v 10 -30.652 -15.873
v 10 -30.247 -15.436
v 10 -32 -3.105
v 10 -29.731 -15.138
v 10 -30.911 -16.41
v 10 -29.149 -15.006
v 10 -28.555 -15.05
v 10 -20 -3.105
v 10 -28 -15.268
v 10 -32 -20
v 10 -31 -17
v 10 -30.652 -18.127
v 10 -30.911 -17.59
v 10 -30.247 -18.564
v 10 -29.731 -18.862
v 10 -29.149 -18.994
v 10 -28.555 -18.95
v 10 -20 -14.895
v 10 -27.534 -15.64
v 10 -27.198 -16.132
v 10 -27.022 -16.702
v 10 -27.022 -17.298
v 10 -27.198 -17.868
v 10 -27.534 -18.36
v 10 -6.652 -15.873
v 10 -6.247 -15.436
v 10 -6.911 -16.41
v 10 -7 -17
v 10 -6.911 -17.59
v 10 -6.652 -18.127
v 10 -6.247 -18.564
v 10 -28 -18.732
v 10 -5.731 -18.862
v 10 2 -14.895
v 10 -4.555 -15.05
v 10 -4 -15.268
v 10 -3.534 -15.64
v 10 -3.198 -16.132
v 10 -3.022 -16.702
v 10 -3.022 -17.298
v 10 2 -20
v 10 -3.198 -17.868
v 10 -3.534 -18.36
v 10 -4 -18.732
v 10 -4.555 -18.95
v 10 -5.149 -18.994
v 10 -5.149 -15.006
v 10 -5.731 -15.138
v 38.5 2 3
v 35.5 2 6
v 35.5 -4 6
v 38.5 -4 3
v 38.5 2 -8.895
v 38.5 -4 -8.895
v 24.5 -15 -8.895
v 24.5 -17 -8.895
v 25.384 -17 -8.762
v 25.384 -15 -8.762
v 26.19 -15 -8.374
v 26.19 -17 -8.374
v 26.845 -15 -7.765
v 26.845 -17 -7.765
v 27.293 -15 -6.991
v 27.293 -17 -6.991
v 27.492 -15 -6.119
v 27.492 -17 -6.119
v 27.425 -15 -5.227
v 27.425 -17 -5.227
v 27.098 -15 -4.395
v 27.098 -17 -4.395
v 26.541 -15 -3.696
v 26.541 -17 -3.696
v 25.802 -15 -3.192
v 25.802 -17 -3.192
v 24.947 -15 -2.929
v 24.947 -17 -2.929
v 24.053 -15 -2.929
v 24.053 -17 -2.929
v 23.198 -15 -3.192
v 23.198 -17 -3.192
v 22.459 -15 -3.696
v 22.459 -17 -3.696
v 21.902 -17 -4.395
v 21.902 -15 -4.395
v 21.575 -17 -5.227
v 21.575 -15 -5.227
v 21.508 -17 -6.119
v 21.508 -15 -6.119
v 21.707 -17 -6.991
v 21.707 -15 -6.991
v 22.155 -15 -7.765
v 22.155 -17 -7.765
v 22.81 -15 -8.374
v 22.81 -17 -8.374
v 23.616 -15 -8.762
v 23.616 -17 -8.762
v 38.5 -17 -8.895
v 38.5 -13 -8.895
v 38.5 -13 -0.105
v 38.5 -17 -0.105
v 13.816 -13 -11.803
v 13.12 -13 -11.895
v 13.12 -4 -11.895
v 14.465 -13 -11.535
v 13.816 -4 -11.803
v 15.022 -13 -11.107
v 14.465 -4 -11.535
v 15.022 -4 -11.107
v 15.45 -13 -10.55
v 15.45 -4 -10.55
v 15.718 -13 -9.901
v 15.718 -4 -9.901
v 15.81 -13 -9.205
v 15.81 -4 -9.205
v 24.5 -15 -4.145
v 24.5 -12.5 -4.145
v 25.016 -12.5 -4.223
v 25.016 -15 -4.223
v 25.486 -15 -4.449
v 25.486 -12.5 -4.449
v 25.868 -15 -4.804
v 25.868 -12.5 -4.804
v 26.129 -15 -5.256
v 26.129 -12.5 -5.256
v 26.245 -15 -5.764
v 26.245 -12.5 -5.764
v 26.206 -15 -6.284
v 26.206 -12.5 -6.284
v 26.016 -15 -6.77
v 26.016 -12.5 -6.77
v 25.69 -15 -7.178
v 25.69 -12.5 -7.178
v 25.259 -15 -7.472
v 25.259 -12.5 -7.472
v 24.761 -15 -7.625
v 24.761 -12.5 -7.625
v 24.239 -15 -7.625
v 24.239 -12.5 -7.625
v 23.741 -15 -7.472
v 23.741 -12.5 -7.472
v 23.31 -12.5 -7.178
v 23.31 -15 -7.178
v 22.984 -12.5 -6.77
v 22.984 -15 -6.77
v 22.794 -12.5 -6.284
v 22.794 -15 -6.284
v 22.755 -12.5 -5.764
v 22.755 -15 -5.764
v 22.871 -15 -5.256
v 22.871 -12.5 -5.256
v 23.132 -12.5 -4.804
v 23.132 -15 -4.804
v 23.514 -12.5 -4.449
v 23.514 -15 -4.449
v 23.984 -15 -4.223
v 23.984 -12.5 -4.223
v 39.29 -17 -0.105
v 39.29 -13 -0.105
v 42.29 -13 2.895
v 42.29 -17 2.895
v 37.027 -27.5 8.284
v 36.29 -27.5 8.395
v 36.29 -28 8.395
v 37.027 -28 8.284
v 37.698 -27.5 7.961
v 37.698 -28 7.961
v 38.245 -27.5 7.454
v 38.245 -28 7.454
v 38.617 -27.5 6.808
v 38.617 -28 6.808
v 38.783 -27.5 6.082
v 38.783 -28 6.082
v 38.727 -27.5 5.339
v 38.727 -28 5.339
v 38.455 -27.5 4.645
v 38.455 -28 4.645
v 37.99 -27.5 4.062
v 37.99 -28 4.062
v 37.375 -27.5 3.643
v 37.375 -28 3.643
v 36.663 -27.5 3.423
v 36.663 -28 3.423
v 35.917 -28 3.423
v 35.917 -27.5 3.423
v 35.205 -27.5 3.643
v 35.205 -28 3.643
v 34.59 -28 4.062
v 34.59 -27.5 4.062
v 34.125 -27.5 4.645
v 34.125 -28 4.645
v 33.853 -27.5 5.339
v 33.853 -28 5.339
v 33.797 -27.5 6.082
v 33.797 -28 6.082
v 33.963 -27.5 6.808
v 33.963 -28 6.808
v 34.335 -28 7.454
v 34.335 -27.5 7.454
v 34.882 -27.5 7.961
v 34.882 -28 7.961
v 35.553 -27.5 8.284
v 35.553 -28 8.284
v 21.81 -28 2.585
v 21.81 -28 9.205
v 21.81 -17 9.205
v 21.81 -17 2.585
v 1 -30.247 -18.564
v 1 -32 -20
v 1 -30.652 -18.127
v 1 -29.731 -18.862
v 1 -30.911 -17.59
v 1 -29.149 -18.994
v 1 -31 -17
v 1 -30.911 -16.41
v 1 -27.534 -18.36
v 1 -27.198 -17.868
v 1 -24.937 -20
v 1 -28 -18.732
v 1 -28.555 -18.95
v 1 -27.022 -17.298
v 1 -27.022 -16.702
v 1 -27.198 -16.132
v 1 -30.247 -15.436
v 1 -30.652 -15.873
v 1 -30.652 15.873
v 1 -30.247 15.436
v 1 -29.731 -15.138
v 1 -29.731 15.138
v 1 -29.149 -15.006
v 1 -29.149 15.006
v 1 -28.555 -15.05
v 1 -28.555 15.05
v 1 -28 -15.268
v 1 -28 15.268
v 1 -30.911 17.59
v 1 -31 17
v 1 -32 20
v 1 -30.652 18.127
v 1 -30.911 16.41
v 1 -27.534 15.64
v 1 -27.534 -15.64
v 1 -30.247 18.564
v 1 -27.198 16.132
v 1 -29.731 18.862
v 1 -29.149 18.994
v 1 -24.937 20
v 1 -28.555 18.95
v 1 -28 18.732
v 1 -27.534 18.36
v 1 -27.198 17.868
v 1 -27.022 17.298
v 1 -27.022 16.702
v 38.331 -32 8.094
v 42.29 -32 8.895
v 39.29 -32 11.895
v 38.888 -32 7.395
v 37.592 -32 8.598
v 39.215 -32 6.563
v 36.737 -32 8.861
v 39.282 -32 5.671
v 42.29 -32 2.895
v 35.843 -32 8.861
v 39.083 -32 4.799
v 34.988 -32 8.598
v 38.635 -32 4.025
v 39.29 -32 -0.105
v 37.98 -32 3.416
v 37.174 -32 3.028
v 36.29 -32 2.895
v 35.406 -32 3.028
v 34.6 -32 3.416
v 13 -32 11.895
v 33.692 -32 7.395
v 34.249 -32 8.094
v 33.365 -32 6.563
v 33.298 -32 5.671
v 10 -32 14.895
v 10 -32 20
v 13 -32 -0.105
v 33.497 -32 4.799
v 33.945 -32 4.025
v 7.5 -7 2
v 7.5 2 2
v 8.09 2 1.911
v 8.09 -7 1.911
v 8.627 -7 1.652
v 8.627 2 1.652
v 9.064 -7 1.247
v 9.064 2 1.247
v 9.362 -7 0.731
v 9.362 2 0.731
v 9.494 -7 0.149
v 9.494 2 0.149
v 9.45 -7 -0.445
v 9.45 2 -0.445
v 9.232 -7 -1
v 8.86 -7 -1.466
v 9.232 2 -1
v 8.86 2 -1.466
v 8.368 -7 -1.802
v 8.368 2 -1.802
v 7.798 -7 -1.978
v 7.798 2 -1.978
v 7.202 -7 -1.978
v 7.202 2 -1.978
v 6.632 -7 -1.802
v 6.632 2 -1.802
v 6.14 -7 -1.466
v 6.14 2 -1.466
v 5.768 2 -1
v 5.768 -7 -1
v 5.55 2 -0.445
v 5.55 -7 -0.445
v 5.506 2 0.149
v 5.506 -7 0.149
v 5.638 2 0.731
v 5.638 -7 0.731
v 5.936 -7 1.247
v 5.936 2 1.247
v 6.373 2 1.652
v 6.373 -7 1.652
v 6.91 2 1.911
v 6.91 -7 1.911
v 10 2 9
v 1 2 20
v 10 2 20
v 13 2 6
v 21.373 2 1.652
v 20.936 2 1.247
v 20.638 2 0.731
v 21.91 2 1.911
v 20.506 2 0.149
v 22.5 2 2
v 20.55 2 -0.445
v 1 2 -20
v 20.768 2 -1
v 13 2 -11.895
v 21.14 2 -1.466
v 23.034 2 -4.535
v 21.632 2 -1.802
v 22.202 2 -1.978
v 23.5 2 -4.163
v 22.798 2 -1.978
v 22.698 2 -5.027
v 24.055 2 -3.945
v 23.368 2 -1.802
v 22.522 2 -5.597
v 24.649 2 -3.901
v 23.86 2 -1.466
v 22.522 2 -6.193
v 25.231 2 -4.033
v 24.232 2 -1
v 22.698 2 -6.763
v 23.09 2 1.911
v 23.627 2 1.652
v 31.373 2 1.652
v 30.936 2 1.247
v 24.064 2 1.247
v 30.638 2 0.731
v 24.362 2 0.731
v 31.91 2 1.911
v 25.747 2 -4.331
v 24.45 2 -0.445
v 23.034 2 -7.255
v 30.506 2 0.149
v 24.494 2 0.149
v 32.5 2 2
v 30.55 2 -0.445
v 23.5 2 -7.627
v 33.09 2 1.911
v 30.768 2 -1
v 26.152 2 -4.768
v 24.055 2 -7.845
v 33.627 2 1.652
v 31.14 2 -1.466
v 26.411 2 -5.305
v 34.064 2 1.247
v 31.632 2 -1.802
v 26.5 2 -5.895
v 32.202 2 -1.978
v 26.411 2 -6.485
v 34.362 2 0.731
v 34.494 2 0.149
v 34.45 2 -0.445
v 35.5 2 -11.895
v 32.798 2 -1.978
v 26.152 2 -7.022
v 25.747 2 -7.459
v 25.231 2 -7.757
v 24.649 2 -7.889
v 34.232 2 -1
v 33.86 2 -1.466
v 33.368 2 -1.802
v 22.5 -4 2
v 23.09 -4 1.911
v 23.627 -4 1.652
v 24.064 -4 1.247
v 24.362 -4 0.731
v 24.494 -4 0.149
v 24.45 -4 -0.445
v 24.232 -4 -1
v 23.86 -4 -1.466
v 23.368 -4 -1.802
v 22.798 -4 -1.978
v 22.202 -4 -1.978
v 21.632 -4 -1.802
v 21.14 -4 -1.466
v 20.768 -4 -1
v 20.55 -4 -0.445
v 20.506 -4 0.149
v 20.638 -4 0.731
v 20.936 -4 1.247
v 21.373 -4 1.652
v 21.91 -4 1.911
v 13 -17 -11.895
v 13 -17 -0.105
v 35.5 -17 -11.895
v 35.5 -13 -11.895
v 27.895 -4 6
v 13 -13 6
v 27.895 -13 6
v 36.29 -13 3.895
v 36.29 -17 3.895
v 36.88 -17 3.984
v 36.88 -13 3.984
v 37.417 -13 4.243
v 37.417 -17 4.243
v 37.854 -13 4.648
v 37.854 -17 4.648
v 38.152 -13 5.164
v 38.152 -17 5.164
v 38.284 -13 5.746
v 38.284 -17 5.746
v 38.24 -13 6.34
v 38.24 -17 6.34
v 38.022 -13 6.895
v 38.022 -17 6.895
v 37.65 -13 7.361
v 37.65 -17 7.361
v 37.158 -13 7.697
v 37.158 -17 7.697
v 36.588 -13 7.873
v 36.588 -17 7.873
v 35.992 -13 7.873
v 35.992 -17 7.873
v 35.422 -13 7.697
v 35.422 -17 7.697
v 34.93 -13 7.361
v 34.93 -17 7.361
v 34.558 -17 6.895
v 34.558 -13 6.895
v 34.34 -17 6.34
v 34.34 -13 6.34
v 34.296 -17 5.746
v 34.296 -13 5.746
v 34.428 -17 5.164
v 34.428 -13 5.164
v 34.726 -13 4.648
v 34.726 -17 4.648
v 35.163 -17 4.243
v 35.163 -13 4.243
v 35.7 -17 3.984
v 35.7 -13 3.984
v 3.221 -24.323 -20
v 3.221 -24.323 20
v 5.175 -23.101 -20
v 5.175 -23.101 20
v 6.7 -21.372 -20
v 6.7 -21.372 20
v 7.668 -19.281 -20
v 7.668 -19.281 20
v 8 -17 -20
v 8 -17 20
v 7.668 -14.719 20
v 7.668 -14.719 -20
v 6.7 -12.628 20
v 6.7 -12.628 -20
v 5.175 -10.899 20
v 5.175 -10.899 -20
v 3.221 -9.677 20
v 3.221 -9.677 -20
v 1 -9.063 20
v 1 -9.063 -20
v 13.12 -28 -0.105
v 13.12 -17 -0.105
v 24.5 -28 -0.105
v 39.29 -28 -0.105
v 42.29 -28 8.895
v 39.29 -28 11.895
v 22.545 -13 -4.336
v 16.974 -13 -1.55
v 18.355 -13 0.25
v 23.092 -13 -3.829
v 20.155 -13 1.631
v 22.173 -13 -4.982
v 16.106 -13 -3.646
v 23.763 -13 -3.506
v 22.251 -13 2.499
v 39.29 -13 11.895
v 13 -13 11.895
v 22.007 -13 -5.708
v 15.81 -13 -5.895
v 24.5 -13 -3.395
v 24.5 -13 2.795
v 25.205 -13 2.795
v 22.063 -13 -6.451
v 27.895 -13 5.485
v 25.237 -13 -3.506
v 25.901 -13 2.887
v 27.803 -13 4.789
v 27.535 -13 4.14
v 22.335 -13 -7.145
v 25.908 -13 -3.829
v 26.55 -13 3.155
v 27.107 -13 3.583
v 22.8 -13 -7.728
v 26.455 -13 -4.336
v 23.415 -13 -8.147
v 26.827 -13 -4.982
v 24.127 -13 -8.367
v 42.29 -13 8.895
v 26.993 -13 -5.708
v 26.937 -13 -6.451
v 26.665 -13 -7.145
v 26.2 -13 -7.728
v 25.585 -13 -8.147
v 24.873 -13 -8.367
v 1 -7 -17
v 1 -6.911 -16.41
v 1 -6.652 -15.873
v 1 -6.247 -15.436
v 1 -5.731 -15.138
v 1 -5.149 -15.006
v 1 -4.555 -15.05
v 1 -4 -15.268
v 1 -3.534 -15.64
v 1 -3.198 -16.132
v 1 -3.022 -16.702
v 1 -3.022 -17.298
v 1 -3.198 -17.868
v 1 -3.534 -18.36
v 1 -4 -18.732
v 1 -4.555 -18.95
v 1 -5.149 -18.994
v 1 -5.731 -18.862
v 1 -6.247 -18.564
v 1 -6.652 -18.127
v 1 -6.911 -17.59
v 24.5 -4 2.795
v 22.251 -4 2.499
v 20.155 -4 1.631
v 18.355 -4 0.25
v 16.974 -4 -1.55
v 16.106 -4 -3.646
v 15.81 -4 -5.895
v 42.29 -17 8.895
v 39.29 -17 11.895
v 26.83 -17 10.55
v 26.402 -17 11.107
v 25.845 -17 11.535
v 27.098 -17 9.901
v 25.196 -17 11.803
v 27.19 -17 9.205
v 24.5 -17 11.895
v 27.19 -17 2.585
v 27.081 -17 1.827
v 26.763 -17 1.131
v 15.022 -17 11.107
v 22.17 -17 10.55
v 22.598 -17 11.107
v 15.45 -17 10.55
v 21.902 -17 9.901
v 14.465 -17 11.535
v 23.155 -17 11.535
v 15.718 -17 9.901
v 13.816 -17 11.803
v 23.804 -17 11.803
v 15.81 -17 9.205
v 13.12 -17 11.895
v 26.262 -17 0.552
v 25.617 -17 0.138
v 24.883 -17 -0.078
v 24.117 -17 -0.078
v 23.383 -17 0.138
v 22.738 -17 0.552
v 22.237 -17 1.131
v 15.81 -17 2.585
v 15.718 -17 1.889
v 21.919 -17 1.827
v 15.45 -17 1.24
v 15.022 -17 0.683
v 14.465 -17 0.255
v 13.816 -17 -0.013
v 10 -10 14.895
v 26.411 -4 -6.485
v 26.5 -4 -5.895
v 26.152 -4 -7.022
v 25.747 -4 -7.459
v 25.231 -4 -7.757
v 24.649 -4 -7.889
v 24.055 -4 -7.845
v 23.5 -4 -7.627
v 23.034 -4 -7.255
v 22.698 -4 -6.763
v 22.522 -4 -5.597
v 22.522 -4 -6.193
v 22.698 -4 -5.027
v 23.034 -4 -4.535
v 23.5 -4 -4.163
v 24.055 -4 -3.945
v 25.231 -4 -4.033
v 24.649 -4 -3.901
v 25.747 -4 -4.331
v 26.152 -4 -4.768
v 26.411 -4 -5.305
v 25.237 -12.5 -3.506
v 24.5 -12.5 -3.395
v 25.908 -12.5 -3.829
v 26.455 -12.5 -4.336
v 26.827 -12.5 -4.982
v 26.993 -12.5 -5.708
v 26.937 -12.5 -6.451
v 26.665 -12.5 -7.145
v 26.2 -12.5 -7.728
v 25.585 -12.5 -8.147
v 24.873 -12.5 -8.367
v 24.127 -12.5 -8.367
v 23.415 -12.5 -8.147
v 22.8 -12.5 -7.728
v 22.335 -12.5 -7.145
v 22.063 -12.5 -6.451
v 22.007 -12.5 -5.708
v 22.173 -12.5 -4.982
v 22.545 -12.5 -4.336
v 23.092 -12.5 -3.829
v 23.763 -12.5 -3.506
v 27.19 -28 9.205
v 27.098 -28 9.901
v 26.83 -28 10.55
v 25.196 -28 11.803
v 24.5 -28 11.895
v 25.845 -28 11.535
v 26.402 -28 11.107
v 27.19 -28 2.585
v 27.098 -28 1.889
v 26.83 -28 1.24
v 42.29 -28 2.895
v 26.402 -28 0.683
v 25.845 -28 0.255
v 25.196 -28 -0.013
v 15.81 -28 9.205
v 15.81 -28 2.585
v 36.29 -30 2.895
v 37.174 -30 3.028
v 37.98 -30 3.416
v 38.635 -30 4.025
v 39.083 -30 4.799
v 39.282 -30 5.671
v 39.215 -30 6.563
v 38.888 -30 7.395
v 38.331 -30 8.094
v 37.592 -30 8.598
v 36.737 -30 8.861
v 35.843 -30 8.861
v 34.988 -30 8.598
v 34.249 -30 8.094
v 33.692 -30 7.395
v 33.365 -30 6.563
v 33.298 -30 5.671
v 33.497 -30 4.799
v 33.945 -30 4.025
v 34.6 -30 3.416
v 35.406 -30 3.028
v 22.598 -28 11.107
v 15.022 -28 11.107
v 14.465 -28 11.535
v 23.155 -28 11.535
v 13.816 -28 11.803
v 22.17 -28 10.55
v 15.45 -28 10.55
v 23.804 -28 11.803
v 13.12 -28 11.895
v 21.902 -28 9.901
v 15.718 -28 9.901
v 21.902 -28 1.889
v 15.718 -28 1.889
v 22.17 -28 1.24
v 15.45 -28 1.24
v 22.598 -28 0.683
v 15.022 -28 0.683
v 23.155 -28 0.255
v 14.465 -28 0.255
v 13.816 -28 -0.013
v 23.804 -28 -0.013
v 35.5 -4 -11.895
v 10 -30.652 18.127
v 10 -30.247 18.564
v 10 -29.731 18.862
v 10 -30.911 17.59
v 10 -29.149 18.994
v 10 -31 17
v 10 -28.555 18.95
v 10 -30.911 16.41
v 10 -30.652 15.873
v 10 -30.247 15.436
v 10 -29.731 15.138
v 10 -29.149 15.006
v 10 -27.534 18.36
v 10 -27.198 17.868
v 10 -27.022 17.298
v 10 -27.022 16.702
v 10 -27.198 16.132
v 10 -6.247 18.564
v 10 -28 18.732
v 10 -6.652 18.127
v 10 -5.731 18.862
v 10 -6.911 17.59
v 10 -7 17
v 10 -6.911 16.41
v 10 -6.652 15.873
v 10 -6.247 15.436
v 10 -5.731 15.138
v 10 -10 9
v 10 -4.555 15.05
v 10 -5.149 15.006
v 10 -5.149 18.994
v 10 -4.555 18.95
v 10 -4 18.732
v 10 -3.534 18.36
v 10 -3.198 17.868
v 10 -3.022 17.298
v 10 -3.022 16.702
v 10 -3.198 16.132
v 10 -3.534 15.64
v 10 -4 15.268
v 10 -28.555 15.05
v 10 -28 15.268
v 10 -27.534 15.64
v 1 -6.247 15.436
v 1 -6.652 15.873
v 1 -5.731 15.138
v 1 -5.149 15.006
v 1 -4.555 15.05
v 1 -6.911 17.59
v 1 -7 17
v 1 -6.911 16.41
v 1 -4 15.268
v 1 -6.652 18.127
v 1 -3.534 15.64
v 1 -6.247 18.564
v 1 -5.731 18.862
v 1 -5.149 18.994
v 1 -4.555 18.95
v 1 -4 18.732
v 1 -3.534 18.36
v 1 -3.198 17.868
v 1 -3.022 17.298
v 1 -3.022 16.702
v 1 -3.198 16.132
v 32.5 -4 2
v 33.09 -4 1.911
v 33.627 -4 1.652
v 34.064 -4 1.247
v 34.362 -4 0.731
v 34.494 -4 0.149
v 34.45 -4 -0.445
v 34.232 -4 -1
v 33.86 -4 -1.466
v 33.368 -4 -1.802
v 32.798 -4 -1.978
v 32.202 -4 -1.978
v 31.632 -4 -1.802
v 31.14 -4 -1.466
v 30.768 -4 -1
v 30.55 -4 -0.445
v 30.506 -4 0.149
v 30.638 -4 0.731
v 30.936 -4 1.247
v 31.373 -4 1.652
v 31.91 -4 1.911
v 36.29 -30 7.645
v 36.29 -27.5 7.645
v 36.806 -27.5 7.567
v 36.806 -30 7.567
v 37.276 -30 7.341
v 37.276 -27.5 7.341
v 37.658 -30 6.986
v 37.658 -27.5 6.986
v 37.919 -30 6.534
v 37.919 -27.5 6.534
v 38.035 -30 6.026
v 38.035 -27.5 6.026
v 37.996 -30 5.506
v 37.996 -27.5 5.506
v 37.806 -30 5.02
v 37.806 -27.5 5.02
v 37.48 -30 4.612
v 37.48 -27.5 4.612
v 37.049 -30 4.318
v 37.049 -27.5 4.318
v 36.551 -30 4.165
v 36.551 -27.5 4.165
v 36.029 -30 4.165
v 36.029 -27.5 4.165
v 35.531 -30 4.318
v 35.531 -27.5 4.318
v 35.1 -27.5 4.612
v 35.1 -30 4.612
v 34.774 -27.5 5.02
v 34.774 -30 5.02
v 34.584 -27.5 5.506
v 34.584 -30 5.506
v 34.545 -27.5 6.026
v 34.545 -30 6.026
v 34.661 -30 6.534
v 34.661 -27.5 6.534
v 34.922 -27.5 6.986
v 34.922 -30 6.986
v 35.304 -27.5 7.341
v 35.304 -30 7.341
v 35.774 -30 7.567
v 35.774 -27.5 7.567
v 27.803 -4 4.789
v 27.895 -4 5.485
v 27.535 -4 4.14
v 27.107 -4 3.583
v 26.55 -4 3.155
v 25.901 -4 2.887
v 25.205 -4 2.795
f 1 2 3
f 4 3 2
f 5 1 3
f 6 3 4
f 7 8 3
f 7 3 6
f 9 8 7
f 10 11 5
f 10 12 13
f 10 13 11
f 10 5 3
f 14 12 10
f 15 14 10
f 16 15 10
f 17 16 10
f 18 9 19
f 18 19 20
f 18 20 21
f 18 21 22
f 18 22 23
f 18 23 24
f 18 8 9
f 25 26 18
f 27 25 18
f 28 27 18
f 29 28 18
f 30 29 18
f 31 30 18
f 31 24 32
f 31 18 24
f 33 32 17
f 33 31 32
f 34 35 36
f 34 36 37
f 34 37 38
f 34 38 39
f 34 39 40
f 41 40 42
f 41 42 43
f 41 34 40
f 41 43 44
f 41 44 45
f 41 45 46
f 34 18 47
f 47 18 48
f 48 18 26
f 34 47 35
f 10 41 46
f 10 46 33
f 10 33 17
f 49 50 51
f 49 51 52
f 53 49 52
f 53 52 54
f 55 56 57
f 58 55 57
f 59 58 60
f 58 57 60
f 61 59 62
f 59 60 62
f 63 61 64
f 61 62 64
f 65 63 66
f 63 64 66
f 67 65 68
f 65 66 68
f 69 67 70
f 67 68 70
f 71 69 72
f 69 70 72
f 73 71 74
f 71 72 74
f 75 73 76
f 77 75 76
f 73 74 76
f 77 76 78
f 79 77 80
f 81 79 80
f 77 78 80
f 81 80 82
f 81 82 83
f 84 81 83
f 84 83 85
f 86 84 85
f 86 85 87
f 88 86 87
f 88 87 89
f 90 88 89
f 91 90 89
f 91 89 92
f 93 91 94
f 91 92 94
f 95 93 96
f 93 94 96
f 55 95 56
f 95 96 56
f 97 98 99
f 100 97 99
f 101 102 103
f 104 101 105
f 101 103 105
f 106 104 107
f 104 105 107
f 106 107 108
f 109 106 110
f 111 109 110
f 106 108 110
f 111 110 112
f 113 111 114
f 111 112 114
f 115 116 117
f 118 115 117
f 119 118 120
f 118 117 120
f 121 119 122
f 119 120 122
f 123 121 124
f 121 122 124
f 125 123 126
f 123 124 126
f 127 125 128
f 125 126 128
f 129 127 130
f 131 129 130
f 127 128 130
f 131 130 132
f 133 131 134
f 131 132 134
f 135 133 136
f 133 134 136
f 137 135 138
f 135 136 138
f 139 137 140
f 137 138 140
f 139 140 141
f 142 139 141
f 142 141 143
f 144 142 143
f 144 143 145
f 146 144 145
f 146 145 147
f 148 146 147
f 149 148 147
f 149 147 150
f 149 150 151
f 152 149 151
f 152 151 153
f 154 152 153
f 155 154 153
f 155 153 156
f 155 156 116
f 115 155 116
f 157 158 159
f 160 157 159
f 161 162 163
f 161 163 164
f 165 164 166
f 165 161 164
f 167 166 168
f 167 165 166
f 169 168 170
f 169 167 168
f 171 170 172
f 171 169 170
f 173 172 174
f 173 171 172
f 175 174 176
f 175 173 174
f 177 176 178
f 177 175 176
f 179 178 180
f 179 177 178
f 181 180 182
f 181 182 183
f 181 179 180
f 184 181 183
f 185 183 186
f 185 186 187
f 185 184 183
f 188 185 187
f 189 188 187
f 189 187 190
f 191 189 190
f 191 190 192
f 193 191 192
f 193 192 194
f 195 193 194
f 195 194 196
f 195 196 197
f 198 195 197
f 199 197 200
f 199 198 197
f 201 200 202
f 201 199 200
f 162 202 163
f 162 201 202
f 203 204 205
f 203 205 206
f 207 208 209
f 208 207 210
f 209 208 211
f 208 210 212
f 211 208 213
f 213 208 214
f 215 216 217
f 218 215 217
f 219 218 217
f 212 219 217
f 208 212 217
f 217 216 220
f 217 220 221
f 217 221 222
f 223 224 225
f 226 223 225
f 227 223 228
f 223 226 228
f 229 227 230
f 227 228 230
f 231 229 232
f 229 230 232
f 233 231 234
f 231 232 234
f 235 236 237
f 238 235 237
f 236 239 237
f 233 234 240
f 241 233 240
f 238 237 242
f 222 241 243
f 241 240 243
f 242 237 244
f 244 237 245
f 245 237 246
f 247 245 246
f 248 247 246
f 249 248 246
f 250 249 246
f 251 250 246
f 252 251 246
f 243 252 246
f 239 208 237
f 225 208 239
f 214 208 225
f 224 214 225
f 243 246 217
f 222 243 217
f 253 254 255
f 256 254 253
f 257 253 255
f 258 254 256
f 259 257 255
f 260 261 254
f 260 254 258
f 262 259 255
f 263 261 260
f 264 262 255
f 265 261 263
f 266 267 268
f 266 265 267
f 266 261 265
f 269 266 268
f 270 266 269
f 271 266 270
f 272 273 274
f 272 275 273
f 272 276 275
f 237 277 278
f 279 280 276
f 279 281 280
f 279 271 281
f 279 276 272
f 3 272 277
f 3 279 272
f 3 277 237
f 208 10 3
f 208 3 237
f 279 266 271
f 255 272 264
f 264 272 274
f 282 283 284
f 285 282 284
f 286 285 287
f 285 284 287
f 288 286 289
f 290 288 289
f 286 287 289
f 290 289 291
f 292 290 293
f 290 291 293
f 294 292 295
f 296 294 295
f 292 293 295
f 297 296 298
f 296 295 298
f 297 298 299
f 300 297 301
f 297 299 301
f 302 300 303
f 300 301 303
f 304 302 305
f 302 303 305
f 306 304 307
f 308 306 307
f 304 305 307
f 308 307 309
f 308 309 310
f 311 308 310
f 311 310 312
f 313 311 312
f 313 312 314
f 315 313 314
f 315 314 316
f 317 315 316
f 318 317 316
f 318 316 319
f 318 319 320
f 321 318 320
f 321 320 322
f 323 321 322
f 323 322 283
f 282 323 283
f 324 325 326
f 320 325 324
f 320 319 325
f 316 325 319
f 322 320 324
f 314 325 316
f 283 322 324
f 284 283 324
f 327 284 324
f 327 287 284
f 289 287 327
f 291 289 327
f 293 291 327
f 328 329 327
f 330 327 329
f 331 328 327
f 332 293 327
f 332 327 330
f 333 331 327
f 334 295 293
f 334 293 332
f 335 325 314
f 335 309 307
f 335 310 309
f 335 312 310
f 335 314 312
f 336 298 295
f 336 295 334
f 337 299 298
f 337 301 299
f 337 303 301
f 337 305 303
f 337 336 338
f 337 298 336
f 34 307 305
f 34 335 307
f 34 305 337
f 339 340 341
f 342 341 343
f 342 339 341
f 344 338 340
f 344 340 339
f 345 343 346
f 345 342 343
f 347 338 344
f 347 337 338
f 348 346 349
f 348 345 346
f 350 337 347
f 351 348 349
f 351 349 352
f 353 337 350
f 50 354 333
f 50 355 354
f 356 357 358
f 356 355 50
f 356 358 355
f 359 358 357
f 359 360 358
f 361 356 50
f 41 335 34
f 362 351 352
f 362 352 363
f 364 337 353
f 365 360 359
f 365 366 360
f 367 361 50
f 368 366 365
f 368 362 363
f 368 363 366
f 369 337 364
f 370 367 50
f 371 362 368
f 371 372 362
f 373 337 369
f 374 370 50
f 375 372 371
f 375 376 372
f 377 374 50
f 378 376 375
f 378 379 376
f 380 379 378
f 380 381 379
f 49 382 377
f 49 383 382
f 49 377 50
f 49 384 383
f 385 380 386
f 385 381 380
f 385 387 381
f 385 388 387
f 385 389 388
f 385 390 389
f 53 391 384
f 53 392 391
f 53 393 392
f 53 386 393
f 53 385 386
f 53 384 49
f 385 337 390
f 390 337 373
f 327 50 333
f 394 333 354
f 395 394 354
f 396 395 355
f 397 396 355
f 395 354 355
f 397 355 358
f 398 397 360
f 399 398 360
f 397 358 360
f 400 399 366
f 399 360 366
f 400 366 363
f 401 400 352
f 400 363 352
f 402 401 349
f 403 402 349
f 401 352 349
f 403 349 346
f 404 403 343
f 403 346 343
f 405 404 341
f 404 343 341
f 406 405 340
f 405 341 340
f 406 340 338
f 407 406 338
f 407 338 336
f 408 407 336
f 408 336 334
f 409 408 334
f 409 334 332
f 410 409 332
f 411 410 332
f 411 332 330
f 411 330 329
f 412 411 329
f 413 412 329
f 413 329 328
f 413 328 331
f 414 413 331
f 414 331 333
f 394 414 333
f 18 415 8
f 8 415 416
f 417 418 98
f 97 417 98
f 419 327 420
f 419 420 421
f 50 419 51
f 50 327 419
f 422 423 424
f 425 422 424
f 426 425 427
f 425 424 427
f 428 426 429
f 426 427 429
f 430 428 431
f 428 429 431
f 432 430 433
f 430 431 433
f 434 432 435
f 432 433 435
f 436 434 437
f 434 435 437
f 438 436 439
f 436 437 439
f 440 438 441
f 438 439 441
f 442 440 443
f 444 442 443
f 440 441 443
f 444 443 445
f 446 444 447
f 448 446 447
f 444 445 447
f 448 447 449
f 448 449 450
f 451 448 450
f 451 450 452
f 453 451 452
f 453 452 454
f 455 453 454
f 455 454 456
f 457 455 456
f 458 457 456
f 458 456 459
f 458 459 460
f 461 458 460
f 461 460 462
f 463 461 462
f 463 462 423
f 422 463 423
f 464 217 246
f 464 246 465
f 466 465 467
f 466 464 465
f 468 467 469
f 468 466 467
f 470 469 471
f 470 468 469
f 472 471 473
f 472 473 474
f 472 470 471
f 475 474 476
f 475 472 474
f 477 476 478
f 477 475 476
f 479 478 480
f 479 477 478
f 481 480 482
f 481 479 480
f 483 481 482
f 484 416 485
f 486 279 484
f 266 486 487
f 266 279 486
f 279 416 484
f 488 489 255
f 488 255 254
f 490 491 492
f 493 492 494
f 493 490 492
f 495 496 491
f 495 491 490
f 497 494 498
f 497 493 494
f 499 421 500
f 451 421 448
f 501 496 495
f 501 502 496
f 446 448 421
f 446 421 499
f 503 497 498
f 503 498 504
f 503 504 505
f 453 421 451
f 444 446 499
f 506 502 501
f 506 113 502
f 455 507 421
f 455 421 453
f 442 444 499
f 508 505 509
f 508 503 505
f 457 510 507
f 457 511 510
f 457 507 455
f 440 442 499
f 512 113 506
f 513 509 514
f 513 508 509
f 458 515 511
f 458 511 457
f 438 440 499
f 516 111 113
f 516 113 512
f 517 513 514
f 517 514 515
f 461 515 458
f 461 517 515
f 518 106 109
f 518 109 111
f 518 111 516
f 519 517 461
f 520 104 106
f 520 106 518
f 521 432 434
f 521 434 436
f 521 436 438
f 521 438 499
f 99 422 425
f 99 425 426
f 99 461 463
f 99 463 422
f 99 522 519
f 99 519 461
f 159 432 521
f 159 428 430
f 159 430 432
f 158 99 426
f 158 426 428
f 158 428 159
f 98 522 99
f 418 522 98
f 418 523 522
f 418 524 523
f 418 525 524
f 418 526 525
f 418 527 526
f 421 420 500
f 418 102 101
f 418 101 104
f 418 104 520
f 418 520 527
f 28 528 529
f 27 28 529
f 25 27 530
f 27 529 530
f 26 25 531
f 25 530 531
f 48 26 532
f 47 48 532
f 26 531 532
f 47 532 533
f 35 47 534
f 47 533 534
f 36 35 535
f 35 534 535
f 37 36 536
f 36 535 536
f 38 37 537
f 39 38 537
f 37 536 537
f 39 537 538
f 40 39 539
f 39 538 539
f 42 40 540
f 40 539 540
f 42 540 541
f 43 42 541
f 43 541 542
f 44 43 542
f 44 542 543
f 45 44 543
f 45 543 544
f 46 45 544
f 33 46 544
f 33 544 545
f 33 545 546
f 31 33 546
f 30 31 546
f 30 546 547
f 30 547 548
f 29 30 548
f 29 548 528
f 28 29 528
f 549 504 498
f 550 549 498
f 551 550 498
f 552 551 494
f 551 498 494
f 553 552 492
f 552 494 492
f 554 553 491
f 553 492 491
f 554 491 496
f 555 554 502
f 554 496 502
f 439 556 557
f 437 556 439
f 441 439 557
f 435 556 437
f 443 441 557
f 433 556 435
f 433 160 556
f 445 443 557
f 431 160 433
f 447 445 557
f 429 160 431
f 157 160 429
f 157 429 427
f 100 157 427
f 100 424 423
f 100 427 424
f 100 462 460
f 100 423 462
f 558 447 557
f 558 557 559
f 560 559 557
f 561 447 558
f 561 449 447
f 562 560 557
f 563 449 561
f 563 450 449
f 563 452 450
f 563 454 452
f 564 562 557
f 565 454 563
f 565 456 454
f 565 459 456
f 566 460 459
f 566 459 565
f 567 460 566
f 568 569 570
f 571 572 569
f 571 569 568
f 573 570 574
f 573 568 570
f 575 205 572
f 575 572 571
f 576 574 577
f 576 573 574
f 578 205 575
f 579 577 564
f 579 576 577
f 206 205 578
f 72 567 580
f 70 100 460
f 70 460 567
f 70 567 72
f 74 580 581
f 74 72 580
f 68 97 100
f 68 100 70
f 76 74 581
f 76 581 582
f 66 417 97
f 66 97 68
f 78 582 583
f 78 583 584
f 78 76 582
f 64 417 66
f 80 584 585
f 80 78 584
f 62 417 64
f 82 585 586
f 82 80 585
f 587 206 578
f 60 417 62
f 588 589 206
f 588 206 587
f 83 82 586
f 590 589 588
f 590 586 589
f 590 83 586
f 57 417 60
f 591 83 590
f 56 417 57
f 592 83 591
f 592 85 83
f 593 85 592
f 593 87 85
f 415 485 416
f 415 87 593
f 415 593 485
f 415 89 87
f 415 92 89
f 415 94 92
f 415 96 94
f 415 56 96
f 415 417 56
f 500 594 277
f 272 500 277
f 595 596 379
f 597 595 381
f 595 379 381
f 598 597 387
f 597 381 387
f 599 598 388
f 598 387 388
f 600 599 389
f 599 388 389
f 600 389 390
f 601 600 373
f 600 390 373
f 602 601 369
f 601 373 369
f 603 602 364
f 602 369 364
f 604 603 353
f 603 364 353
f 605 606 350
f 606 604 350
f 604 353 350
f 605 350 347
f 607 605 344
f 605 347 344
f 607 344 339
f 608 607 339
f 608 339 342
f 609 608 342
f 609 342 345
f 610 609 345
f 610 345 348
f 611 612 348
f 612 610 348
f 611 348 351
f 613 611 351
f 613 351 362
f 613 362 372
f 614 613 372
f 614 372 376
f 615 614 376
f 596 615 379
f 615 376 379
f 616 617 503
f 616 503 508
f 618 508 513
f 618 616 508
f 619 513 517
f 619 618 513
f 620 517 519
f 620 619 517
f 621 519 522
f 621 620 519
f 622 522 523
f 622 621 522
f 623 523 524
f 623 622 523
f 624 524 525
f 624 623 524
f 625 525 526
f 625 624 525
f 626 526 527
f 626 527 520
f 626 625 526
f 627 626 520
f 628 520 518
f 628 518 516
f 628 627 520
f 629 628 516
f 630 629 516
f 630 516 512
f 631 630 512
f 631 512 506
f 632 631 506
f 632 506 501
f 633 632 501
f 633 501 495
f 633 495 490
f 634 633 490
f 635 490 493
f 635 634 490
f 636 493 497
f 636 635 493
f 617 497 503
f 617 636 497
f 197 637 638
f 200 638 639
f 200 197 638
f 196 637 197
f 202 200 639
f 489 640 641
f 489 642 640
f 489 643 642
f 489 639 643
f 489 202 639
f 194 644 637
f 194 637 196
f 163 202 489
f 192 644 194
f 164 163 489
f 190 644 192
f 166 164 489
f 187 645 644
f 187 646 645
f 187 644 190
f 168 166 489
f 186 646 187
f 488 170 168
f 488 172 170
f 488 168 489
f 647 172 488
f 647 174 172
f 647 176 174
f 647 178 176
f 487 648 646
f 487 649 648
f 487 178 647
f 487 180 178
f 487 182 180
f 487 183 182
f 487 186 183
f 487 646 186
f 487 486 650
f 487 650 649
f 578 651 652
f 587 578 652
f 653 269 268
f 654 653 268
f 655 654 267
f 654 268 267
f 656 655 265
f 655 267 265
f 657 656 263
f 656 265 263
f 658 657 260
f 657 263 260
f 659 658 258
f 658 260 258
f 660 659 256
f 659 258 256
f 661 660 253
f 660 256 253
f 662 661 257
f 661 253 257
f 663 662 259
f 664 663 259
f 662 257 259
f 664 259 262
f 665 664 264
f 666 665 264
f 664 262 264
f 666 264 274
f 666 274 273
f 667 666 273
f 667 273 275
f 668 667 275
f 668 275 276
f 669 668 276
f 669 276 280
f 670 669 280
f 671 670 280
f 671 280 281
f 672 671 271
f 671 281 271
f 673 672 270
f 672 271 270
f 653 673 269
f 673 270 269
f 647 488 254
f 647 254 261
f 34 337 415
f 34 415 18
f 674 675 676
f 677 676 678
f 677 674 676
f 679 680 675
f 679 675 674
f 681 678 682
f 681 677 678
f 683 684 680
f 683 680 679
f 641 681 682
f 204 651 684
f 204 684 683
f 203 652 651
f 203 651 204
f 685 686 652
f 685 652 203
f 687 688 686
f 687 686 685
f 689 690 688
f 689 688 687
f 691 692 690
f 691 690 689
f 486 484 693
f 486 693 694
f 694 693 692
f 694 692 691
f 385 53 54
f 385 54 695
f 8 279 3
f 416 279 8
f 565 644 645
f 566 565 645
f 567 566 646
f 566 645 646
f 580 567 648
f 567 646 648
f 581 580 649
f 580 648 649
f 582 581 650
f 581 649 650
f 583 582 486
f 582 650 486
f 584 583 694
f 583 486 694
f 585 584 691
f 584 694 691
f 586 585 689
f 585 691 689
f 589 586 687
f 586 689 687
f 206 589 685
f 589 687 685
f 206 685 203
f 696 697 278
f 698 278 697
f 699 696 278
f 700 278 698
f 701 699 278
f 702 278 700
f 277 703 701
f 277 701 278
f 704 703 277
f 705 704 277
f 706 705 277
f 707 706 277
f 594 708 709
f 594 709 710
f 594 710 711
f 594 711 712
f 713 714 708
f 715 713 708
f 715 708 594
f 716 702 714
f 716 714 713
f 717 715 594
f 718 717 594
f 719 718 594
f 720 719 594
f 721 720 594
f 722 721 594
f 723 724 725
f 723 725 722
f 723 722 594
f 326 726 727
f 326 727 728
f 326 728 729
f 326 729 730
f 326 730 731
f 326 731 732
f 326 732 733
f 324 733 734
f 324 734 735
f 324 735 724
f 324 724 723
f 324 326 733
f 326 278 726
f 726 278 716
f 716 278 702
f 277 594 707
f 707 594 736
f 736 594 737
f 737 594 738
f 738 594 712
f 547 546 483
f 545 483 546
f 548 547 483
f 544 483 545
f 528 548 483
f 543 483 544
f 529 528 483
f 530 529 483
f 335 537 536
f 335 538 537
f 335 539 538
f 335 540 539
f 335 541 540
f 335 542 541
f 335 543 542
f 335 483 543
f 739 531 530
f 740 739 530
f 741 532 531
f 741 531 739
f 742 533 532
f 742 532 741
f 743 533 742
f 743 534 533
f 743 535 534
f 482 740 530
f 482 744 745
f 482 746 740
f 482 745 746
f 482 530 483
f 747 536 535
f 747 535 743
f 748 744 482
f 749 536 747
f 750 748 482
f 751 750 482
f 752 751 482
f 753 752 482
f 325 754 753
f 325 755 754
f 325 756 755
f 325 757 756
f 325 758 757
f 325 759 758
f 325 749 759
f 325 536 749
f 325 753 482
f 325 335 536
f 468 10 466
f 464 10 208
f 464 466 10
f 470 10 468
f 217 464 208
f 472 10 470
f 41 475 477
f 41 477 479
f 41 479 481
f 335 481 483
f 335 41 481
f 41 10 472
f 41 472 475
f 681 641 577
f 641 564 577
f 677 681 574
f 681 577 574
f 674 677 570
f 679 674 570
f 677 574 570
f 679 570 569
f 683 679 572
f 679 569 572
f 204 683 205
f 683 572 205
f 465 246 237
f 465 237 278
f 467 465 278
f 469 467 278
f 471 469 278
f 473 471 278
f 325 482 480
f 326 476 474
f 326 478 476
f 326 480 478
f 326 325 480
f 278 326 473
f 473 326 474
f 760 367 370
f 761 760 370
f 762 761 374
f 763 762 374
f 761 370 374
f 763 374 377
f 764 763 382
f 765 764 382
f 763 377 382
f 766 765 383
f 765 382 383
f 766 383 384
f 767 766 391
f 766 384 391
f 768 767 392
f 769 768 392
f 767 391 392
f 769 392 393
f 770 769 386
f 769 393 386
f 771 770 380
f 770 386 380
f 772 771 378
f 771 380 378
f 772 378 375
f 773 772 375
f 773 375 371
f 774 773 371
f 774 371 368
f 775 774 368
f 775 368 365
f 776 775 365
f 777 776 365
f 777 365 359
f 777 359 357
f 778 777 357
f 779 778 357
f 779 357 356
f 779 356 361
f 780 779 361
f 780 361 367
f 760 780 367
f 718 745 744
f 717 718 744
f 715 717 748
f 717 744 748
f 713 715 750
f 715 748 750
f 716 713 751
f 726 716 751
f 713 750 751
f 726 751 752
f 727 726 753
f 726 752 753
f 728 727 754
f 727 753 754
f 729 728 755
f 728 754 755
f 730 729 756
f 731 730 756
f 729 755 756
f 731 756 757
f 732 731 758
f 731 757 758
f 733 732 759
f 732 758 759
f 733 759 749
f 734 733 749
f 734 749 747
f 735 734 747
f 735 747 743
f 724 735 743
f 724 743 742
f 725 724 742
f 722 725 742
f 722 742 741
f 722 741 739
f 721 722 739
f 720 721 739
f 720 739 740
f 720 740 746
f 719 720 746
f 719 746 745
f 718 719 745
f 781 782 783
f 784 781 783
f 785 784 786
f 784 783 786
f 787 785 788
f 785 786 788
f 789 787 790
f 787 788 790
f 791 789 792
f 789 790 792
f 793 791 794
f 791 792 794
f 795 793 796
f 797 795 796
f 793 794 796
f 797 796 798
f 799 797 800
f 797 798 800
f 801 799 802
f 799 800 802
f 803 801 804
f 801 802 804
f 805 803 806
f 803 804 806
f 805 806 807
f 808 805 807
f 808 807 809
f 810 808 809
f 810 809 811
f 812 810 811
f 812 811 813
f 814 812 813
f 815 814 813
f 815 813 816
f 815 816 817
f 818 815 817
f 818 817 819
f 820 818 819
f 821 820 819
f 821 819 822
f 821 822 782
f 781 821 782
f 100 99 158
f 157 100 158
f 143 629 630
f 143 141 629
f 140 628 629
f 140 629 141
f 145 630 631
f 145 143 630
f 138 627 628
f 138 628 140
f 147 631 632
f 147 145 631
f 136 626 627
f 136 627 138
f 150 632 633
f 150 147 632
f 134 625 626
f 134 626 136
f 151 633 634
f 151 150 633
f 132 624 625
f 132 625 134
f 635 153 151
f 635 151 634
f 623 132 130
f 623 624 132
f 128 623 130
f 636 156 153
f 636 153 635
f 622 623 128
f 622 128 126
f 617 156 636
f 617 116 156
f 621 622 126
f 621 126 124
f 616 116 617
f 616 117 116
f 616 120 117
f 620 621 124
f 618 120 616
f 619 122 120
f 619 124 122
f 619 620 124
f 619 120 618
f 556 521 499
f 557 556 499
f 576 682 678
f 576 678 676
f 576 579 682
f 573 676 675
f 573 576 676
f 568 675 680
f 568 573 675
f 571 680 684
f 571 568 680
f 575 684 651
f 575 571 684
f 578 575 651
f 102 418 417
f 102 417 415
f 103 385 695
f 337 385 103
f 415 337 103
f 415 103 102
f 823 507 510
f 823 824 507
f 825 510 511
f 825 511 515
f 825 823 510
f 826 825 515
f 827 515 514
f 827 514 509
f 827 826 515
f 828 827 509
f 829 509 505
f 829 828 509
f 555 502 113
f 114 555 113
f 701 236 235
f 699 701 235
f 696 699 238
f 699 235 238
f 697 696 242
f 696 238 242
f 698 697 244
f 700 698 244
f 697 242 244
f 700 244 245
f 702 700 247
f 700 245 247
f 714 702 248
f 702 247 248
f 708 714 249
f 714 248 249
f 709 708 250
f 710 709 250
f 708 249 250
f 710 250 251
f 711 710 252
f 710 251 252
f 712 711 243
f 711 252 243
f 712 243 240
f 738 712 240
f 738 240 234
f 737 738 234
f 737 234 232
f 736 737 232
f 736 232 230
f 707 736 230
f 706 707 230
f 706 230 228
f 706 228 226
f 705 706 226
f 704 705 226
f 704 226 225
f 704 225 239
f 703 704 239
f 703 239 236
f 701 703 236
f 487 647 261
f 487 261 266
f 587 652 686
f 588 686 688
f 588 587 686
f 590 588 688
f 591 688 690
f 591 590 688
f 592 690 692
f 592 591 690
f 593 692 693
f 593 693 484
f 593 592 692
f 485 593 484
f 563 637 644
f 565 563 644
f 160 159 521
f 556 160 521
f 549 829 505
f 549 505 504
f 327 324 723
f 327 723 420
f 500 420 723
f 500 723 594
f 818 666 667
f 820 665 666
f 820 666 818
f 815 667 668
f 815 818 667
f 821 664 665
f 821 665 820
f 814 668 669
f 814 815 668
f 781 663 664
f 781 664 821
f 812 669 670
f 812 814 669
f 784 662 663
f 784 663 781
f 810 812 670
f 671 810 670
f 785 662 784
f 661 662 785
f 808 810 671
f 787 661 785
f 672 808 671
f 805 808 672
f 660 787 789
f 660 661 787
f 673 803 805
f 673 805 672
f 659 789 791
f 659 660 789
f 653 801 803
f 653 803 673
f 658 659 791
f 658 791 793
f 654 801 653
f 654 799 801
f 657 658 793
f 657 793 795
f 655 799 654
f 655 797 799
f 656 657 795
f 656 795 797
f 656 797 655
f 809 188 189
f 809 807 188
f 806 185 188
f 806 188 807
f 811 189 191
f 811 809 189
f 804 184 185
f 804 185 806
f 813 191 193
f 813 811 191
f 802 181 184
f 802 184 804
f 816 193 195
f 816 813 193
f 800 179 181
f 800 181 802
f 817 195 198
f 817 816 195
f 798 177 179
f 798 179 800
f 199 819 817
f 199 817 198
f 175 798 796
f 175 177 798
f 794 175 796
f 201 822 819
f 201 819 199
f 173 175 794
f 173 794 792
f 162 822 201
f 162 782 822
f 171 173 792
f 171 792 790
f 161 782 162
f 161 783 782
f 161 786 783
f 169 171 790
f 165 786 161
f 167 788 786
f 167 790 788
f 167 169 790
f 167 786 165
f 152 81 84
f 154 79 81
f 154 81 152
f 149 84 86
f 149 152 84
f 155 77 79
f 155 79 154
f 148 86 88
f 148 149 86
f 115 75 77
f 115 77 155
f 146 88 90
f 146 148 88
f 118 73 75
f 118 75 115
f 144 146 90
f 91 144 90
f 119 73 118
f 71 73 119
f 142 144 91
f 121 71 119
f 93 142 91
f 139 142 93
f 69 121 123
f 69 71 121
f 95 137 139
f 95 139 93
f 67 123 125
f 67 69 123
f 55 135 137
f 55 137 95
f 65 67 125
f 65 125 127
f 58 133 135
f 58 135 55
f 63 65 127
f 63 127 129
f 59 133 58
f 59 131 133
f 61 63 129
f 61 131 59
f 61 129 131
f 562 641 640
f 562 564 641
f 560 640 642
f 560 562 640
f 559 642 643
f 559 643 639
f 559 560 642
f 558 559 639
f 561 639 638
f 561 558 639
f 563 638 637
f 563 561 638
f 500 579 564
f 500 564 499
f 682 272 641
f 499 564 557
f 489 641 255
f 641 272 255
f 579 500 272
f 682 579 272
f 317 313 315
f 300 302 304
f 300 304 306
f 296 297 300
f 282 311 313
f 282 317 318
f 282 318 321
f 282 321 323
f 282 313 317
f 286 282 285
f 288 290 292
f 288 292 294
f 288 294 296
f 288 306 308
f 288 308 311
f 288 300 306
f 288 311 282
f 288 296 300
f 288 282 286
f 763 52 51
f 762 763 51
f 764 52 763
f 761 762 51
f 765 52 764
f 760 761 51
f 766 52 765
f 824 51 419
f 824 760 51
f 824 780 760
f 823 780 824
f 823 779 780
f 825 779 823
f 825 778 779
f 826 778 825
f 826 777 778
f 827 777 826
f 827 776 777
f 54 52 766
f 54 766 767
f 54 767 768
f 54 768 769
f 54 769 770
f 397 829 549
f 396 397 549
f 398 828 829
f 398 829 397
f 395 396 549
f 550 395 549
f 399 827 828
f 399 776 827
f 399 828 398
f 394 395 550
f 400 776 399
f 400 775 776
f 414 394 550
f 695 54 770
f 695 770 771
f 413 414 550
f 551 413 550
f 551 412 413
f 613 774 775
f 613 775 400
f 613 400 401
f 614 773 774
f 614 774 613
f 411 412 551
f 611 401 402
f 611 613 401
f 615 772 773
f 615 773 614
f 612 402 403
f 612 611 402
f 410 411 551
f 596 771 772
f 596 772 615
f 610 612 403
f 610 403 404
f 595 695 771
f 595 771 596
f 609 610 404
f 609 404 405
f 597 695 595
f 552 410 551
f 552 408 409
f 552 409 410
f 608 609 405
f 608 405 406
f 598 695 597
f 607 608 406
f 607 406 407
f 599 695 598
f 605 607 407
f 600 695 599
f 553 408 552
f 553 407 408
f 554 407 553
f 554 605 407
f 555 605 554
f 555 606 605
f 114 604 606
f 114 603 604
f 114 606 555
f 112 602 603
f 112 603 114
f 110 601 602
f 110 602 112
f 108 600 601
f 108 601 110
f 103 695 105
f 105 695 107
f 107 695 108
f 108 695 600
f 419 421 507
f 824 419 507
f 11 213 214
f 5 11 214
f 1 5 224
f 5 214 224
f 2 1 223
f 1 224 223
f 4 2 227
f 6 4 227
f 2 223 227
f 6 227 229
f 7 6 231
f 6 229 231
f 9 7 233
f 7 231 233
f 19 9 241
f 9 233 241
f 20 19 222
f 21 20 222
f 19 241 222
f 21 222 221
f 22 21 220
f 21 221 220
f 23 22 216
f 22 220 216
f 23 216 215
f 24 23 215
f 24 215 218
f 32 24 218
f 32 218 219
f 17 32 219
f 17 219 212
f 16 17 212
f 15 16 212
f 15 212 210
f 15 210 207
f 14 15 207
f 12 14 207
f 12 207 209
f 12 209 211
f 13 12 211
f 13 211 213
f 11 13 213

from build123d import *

# Parameters (mm, degrees)
BOSS_EXTRUDE1_DEPTH      = 20
BOSS_EXTRUDE1_DEPTH_BACK = 20
SKETCH2_R                = 1.75
CUT_EXTRUDE1_DEPTH       = 59.72818744
SKETCH3_R                = 2
CUT_EXTRUDE2_DEPTH       = 7
CUT_EXTRUDE3_REACH       = 60.728
CUT_EXTRUDE4_REACH       = 54.783
CUT_EXTRUDE5_REACH       = 58.648
BOSS_EXTRUDE3_DEPTH      = 9
SKETCH10_W               = 5.38
SKETCH10_H               = 12
SKETCH10_W_2             = 5.81
BOSS_EXTRUDE4_DEPTH      = 11
FILLET1_R                = 2.69
FILLET2_R                = 2.69
FILLET3_R                = 2.69
CHAMFER1_SIZE            = 3
CUT_EXTRUDE8_REACH       = 51.774
SKETCH14_R               = 2
SKETCH16_R               = 2
CUT_EXTRUDE9_DEPTH       = 10
BOSS_EXTRUDE5_START      = 0.5
SKETCH17_R               = 2.5
SKETCH17_R_2             = 1.75
BOSS_EXTRUDE5_DEPTH      = 0.5
BOSS_EXTRUDE6_START      = 0.5
SKETCH18_R               = 2.5
SKETCH18_R_2             = 1.75
BOSS_EXTRUDE6_DEPTH      = 0.5
SKETCH20_R               = 3
CUT_EXTRUDE10_DEPTH      = 2
SKETCH21_R               = 3
CUT_EXTRUDE11_DEPTH      = 2
SKETCH11_R               = 2
CUT_EXTRUDE6_DEPTH       = 10
SKETCH12_W               = 1
SKETCH12_H               = 32
CUT_EXTRUDE7_DEPTH       = 67.426230512
BOSS_EXTRUDE7_DEPTH      = 4
BOSS_EXTRUDE8_START      = 2
SKETCH23_R               = 2
BOSS_EXTRUDE8_DEPTH      = 2


# Some blends are built 0.0001 mm under size
with BuildPart() as part:
    # Sketch1 → Boss-Extrude1 (new, two sides: drawn at the far end of the back side and taken through both)
    with BuildSketch(Plane.XY.offset(-BOSS_EXTRUDE1_DEPTH_BACK)):
        with BuildLine():
            Line((0, 0), (45, 0))
            Line((45, 0), (45, -4))
            Line((45, -4), (10, -4))
            Line((10, -4), (10, -13))
            Line((10, -13), (45, -13))
            Line((45, -13), (45, -17))
            Line((45, -17), (10, -17))
            Line((10, -17), (10, -28))
            Line((10, -28), (45, -28))
            Line((45, -28), (45, -32))
            Line((45, -32), (0, -32))
            Line((0, -32), (0, -28))
            Line((0, -28), (0, -25))
            ThreePointArc((0, -25), (8, -17), (0, -9))
            Line((0, -9), (0, -4))
            Line((0, -4), (0, 0))
        make_face()
    extrude(amount=BOSS_EXTRUDE1_DEPTH + BOSS_EXTRUDE1_DEPTH_BACK)

    # Sketch2 → Cut-Extrude1 (cut, through all)
    with BuildSketch(Plane(origin=(0, 0, 0), x_dir=(1, 0, 0), z_dir=(0, 1, 0))):
        with Locations(Location((24.5, 5.895, 0), (0, 0, 270))):
            Circle(SKETCH2_R)
        with Locations(Location((36.29, -5.895, 0), (0, 0, 270))):
            Circle(SKETCH2_R)
    extrude(amount=-CUT_EXTRUDE1_DEPTH, mode=Mode.SUBTRACT)

    # Sketch3 → Cut-Extrude2 (cut)
    with BuildSketch(Plane(origin=(0, 0, 0), x_dir=(1, 0, 0), z_dir=(0, 1, 0))):
        with Locations(Location((7.5, 0, 0), (0, 0, 270))):
            Circle(SKETCH3_R)
        with Locations(Location((22.5, 0, 0), (0, 0, 270))):
            Circle(SKETCH3_R)
        with Locations(Location((32.5, 0, 0), (0, 0, 270))):
            Circle(SKETCH3_R)
    extrude(amount=-CUT_EXTRUDE2_DEPTH, mode=Mode.SUBTRACT)

    # Sketch5 → Cut-Extrude3 (cut, up to next)
    with BuildSketch(Plane(origin=(0, 0, 0), x_dir=(1, 0, 0), z_dir=(0, 1, 0)), mode=Mode.PRIVATE) as cut_extrude3_sk1:
        Polygon((10, 20), (10, 11.895), (35.5, 11.895), (38.5, 8.895), (38.5, -3), (35.5, -6), (10, -6), (10, -20), (45, -20), (45, 20), align=None)
    cut_extrude3_tool1 = extrude(cut_extrude3_sk1.sketch, amount=-CUT_EXTRUDE3_REACH, mode=Mode.PRIVATE) & part.part
    add(cut_extrude3_tool1.solids().sort_by_distance((10.531507, 0, -15.9475))[0], mode=Mode.SUBTRACT)

    # Sketch6 → Cut-Extrude4 (cut, up to next)
    with BuildSketch(Plane(origin=(0, -13, 0), x_dir=(1, 0, 0), z_dir=(0, 1, 0)), mode=Mode.PRIVATE) as cut_extrude4_sk1:
        Polygon((45, 20), (10, 20), (10, 11.895), (35.5, 11.895), (38.5, 8.895), (38.5, 0.105), (39.29, 0.105), (42.29, -2.895), (42.29, -8.895), (39.29, -11.895), (10, -11.895), (10, -20), (45, -20), align=None)
    cut_extrude4_tool1 = extrude(cut_extrude4_sk1.sketch, amount=-CUT_EXTRUDE4_REACH, mode=Mode.PRIVATE) & part.part
    add(cut_extrude4_tool1.solids().sort_by_distance((27.5, -13, -19.468493))[0], mode=Mode.SUBTRACT)

    # Sketch7 → Cut-Extrude5 (cut, up to next)
    with BuildSketch(Plane(origin=(0, -28, 0), x_dir=(1, 0, 0), z_dir=(0, 1, 0)), mode=Mode.PRIVATE) as cut_extrude5_sk1:
        Polygon((10, -11.895), (39.29, -11.895), (42.29, -8.895), (42.29, -2.895), (39.29, 0.105), (10, 0.105), (10, 20), (45, 20), (45, -20), (10, -20), align=None)
    cut_extrude5_tool1 = extrude(cut_extrude5_sk1.sketch, amount=-CUT_EXTRUDE5_REACH, mode=Mode.PRIVATE) & part.part
    add(cut_extrude5_tool1.solids().sort_by_distance((28.13547, -28, -2.184137))[0], mode=Mode.SUBTRACT)

    # Sketch9 → Boss-Extrude3 (add)
    with BuildSketch(Plane(origin=(0, -13, 0), x_dir=(1, 0, 0), z_dir=(0, 1, 0))):
        with BuildLine():
            ThreePointArc((24.5, -2.795), (18.355242071, -0.249757929), (15.81, 5.895))
            Line((15.81, 5.895), (15.81, 11.895))
            Line((15.81, 11.895), (10, 11.895))
            Line((10, 11.895), (10, -6))
            Line((10, -6), (27.895, -6))
            Line((27.895, -6), (27.895, -2.795))
            Line((27.895, -2.795), (24.5, -2.795))
        make_face()
    extrude(amount=BOSS_EXTRUDE3_DEPTH)

    # Sketch10 → Boss-Extrude4 (add)
    with BuildSketch(Plane(origin=(0, -28, 0), x_dir=(1, 0, 0), z_dir=(0, 1, 0))):
        with Locations((24.5, -5.895)):
            Rectangle(SKETCH10_W, SKETCH10_H)
        with Locations((12.905, -5.895)):
            Rectangle(SKETCH10_W_2, SKETCH10_H)
    extrude(amount=BOSS_EXTRUDE4_DEPTH)

    # Fillet1
    # the kernel refuses this fillet: 2.69 mm, written as the material it adds along each edge
    # the kernel refuses this fillet: 2.69 mm, written as the material it takes off along each edge
    with BuildSketch(Plane(origin=(21.81, -28, -0.105), x_dir=(0, 0, 1), z_dir=(0, 1, 0))) as fillet1_2_piece_1:
        with BuildLine():
            CenterArc((FILLET1_R, FILLET1_R), FILLET1_R, 180, 90)
            Line((0, FILLET1_R), (0, 0))
            Line((0, 0), (FILLET1_R, 0))
        make_face()
    extrude(amount=11, mode=Mode.SUBTRACT)
    with BuildSketch(Plane(origin=(27.19, -28, -0.105), x_dir=(0, 0, 1), z_dir=(0, 1, 0))) as fillet1_2_piece_2:
        with BuildLine():
            CenterArc((FILLET1_R, -FILLET1_R), FILLET1_R, 90, 90)
            Line((0, -FILLET1_R), (0, 0))
            Line((0, 0), (FILLET1_R, 0))
        make_face()
    extrude(amount=11, mode=Mode.SUBTRACT)

    # Fillet2
    fillet2_edges = [part.edges().sort_by_distance(p)[0] for p in [
        (27.19, -22.5, 11.895),
        (21.81, -22.5, 11.895),
    ]]
    fillet(fillet2_edges, radius=FILLET2_R - 0.0001)  # a hair under: the kernel refuses the full size

    # Fillet3
    fillet3_edges = [part.edges().sort_by_distance(p)[0] for p in [
        (15.81, -8.5, -11.895),
        (27.895, -8.5, 2.795),
        (15.81, -22.5, -0.105),
        (15.81, -22.5, 11.895),
    ]]
    fillet(fillet3_edges, radius=FILLET3_R)

    # Chamfer1
    chamfer1_edges = [part.edges().sort_by_distance(p)[0] for p in [
        (10, -8.5, -11.895),
        (10, -6.5, 6),
        (10, -17, -6),
        (10, -22.5, 11.895),
        (10, -24.5, -0.105),
        (10, -13, 8.9475),
    ]]
    chamfer(chamfer1_edges, length=CHAMFER1_SIZE)

    # Sketch14 → Cut-Extrude8 (cut, up to next)
    with BuildSketch(Plane.XZ.offset(17), mode=Mode.PRIVATE) as cut_extrude8_sk1:
        with Locations(Location((36.29, 5.895, 0), (0, 0, 270))):
            Circle(SKETCH14_R)
    cut_extrude8_tool1 = extrude(cut_extrude8_sk1.sketch, amount=-CUT_EXTRUDE8_REACH, mode=Mode.PRIVATE) & part.part
    add(cut_extrude8_tool1.solids().sort_by_distance((36.29, -17, 5.895))[0], mode=Mode.SUBTRACT)

    # Sketch16 → Cut-Extrude9 (cut)
    with BuildSketch(Plane.XZ.offset(4)):
        with Locations((24.5, -5.895)):
            Circle(SKETCH16_R)
    extrude(amount=-CUT_EXTRUDE9_DEPTH, mode=Mode.SUBTRACT)

    # Sketch17 → Boss-Extrude5 (add)
    with BuildSketch(Plane(origin=(0, -13, 0), x_dir=(1, 0, 0), z_dir=(0, 1, 0)).offset(BOSS_EXTRUDE5_START)):
        with Locations(Location((24.5, 5.895, 0), (0, 0, 270))):
            Circle(SKETCH17_R)
        with Locations(Location((24.5, 5.895, 0), (0, 0, 270))):
            Circle(SKETCH17_R_2, mode=Mode.SUBTRACT)
    extrude(amount=-BOSS_EXTRUDE5_DEPTH)

    # Sketch18 → Boss-Extrude6 (add)
    with BuildSketch(Plane(origin=(0, -28, 0), x_dir=(1, 0, 0), z_dir=(0, 1, 0)).offset(BOSS_EXTRUDE6_START)):
        with Locations(Location((36.29, -5.895, 0), (0, 0, 270))):
            Circle(SKETCH18_R)
        with Locations(Location((36.29, -5.895, 0), (0, 0, 270))):
            Circle(SKETCH18_R_2, mode=Mode.SUBTRACT)
    extrude(amount=-BOSS_EXTRUDE6_DEPTH)

    # Sketch20 → Cut-Extrude10 (cut)
    with BuildSketch(Plane.XZ.offset(32)):
        with Locations(Location((36.29, 5.895, 0), (0, 0, 270))):
            Circle(SKETCH20_R)
    extrude(amount=-CUT_EXTRUDE10_DEPTH, mode=Mode.SUBTRACT)

    # Sketch21 → Cut-Extrude11 (cut)
    with BuildSketch(Plane.XZ.offset(17)):
        with Locations(Location((24.5, -5.895, 0), (0, 0, 270))):
            Circle(SKETCH21_R)
    extrude(amount=-CUT_EXTRUDE11_DEPTH, mode=Mode.SUBTRACT)

    # Sketch11 → Cut-Extrude6 (cut)
    with BuildSketch(Plane.ZY):
        with Locations(Location((17, -5, 0), (0, 0, 270))):
            Circle(SKETCH11_R)
        with Locations(Location((17, -29, 0), (0, 0, 270))):
            Circle(SKETCH11_R)
        with Locations(Location((-17, -29, 0), (0, 0, 270))):
            Circle(SKETCH11_R)
        with Locations(Location((-17, -5, 0), (0, 0, 270))):
            Circle(SKETCH11_R)
    extrude(amount=-CUT_EXTRUDE6_DEPTH, mode=Mode.SUBTRACT)

    # Sketch12 → Cut-Extrude7 (cut, through all)
    with BuildSketch(Plane.XY.offset(20)):
        with Locations((0.5, -16)):
            Rectangle(SKETCH12_W, SKETCH12_H)
    extrude(amount=-CUT_EXTRUDE7_DEPTH, mode=Mode.SUBTRACT)

    # Sketch22 → Boss-Extrude7 (add)
    with BuildSketch(Plane(origin=(0, 0, 0), x_dir=(1, 0, 0), z_dir=(0, 1, 0))):
        with BuildLine():
            Line((37.136593667, -4.363406333), (35.5, -6))
            Line((35.5, -6), (34.54315284, -6))
            ThreePointArc((34.54315284, -6), (35.356070776, -4.415041823), (37.136593667, -4.363406333))
        make_face()
    extrude(amount=-BOSS_EXTRUDE7_DEPTH)

    # Sketch23 → Boss-Extrude8 (add)
    with BuildSketch(Plane(origin=(0, 0, 0), x_dir=(1, 0, 0), z_dir=(0, 1, 0)).offset(BOSS_EXTRUDE8_START)):
        Polygon((35.5, 11.895), (13, 11.895), (10, 14.895), (10, 20), (1, 20), (1, -20), (10, -20), (10, -9), (13, -6), (35.5, -6), (38.5, -3), (38.5, 8.895), align=None)
        with Locations((24.5, 5.895)):
            Circle(SKETCH23_R, mode=Mode.SUBTRACT)
        with Locations(Location((32.5, 0, 0), (0, 0, 270))):
            Circle(SKETCH23_R, mode=Mode.SUBTRACT)
        with Locations(Location((22.5, 0, 0), (0, 0, 270))):
            Circle(SKETCH23_R, mode=Mode.SUBTRACT)
        with Locations(Location((7.5, 0, 0), (0, 0, 270))):
            Circle(SKETCH23_R, mode=Mode.SUBTRACT)
    extrude(amount=-BOSS_EXTRUDE8_DEPTH)


solid = part.part
